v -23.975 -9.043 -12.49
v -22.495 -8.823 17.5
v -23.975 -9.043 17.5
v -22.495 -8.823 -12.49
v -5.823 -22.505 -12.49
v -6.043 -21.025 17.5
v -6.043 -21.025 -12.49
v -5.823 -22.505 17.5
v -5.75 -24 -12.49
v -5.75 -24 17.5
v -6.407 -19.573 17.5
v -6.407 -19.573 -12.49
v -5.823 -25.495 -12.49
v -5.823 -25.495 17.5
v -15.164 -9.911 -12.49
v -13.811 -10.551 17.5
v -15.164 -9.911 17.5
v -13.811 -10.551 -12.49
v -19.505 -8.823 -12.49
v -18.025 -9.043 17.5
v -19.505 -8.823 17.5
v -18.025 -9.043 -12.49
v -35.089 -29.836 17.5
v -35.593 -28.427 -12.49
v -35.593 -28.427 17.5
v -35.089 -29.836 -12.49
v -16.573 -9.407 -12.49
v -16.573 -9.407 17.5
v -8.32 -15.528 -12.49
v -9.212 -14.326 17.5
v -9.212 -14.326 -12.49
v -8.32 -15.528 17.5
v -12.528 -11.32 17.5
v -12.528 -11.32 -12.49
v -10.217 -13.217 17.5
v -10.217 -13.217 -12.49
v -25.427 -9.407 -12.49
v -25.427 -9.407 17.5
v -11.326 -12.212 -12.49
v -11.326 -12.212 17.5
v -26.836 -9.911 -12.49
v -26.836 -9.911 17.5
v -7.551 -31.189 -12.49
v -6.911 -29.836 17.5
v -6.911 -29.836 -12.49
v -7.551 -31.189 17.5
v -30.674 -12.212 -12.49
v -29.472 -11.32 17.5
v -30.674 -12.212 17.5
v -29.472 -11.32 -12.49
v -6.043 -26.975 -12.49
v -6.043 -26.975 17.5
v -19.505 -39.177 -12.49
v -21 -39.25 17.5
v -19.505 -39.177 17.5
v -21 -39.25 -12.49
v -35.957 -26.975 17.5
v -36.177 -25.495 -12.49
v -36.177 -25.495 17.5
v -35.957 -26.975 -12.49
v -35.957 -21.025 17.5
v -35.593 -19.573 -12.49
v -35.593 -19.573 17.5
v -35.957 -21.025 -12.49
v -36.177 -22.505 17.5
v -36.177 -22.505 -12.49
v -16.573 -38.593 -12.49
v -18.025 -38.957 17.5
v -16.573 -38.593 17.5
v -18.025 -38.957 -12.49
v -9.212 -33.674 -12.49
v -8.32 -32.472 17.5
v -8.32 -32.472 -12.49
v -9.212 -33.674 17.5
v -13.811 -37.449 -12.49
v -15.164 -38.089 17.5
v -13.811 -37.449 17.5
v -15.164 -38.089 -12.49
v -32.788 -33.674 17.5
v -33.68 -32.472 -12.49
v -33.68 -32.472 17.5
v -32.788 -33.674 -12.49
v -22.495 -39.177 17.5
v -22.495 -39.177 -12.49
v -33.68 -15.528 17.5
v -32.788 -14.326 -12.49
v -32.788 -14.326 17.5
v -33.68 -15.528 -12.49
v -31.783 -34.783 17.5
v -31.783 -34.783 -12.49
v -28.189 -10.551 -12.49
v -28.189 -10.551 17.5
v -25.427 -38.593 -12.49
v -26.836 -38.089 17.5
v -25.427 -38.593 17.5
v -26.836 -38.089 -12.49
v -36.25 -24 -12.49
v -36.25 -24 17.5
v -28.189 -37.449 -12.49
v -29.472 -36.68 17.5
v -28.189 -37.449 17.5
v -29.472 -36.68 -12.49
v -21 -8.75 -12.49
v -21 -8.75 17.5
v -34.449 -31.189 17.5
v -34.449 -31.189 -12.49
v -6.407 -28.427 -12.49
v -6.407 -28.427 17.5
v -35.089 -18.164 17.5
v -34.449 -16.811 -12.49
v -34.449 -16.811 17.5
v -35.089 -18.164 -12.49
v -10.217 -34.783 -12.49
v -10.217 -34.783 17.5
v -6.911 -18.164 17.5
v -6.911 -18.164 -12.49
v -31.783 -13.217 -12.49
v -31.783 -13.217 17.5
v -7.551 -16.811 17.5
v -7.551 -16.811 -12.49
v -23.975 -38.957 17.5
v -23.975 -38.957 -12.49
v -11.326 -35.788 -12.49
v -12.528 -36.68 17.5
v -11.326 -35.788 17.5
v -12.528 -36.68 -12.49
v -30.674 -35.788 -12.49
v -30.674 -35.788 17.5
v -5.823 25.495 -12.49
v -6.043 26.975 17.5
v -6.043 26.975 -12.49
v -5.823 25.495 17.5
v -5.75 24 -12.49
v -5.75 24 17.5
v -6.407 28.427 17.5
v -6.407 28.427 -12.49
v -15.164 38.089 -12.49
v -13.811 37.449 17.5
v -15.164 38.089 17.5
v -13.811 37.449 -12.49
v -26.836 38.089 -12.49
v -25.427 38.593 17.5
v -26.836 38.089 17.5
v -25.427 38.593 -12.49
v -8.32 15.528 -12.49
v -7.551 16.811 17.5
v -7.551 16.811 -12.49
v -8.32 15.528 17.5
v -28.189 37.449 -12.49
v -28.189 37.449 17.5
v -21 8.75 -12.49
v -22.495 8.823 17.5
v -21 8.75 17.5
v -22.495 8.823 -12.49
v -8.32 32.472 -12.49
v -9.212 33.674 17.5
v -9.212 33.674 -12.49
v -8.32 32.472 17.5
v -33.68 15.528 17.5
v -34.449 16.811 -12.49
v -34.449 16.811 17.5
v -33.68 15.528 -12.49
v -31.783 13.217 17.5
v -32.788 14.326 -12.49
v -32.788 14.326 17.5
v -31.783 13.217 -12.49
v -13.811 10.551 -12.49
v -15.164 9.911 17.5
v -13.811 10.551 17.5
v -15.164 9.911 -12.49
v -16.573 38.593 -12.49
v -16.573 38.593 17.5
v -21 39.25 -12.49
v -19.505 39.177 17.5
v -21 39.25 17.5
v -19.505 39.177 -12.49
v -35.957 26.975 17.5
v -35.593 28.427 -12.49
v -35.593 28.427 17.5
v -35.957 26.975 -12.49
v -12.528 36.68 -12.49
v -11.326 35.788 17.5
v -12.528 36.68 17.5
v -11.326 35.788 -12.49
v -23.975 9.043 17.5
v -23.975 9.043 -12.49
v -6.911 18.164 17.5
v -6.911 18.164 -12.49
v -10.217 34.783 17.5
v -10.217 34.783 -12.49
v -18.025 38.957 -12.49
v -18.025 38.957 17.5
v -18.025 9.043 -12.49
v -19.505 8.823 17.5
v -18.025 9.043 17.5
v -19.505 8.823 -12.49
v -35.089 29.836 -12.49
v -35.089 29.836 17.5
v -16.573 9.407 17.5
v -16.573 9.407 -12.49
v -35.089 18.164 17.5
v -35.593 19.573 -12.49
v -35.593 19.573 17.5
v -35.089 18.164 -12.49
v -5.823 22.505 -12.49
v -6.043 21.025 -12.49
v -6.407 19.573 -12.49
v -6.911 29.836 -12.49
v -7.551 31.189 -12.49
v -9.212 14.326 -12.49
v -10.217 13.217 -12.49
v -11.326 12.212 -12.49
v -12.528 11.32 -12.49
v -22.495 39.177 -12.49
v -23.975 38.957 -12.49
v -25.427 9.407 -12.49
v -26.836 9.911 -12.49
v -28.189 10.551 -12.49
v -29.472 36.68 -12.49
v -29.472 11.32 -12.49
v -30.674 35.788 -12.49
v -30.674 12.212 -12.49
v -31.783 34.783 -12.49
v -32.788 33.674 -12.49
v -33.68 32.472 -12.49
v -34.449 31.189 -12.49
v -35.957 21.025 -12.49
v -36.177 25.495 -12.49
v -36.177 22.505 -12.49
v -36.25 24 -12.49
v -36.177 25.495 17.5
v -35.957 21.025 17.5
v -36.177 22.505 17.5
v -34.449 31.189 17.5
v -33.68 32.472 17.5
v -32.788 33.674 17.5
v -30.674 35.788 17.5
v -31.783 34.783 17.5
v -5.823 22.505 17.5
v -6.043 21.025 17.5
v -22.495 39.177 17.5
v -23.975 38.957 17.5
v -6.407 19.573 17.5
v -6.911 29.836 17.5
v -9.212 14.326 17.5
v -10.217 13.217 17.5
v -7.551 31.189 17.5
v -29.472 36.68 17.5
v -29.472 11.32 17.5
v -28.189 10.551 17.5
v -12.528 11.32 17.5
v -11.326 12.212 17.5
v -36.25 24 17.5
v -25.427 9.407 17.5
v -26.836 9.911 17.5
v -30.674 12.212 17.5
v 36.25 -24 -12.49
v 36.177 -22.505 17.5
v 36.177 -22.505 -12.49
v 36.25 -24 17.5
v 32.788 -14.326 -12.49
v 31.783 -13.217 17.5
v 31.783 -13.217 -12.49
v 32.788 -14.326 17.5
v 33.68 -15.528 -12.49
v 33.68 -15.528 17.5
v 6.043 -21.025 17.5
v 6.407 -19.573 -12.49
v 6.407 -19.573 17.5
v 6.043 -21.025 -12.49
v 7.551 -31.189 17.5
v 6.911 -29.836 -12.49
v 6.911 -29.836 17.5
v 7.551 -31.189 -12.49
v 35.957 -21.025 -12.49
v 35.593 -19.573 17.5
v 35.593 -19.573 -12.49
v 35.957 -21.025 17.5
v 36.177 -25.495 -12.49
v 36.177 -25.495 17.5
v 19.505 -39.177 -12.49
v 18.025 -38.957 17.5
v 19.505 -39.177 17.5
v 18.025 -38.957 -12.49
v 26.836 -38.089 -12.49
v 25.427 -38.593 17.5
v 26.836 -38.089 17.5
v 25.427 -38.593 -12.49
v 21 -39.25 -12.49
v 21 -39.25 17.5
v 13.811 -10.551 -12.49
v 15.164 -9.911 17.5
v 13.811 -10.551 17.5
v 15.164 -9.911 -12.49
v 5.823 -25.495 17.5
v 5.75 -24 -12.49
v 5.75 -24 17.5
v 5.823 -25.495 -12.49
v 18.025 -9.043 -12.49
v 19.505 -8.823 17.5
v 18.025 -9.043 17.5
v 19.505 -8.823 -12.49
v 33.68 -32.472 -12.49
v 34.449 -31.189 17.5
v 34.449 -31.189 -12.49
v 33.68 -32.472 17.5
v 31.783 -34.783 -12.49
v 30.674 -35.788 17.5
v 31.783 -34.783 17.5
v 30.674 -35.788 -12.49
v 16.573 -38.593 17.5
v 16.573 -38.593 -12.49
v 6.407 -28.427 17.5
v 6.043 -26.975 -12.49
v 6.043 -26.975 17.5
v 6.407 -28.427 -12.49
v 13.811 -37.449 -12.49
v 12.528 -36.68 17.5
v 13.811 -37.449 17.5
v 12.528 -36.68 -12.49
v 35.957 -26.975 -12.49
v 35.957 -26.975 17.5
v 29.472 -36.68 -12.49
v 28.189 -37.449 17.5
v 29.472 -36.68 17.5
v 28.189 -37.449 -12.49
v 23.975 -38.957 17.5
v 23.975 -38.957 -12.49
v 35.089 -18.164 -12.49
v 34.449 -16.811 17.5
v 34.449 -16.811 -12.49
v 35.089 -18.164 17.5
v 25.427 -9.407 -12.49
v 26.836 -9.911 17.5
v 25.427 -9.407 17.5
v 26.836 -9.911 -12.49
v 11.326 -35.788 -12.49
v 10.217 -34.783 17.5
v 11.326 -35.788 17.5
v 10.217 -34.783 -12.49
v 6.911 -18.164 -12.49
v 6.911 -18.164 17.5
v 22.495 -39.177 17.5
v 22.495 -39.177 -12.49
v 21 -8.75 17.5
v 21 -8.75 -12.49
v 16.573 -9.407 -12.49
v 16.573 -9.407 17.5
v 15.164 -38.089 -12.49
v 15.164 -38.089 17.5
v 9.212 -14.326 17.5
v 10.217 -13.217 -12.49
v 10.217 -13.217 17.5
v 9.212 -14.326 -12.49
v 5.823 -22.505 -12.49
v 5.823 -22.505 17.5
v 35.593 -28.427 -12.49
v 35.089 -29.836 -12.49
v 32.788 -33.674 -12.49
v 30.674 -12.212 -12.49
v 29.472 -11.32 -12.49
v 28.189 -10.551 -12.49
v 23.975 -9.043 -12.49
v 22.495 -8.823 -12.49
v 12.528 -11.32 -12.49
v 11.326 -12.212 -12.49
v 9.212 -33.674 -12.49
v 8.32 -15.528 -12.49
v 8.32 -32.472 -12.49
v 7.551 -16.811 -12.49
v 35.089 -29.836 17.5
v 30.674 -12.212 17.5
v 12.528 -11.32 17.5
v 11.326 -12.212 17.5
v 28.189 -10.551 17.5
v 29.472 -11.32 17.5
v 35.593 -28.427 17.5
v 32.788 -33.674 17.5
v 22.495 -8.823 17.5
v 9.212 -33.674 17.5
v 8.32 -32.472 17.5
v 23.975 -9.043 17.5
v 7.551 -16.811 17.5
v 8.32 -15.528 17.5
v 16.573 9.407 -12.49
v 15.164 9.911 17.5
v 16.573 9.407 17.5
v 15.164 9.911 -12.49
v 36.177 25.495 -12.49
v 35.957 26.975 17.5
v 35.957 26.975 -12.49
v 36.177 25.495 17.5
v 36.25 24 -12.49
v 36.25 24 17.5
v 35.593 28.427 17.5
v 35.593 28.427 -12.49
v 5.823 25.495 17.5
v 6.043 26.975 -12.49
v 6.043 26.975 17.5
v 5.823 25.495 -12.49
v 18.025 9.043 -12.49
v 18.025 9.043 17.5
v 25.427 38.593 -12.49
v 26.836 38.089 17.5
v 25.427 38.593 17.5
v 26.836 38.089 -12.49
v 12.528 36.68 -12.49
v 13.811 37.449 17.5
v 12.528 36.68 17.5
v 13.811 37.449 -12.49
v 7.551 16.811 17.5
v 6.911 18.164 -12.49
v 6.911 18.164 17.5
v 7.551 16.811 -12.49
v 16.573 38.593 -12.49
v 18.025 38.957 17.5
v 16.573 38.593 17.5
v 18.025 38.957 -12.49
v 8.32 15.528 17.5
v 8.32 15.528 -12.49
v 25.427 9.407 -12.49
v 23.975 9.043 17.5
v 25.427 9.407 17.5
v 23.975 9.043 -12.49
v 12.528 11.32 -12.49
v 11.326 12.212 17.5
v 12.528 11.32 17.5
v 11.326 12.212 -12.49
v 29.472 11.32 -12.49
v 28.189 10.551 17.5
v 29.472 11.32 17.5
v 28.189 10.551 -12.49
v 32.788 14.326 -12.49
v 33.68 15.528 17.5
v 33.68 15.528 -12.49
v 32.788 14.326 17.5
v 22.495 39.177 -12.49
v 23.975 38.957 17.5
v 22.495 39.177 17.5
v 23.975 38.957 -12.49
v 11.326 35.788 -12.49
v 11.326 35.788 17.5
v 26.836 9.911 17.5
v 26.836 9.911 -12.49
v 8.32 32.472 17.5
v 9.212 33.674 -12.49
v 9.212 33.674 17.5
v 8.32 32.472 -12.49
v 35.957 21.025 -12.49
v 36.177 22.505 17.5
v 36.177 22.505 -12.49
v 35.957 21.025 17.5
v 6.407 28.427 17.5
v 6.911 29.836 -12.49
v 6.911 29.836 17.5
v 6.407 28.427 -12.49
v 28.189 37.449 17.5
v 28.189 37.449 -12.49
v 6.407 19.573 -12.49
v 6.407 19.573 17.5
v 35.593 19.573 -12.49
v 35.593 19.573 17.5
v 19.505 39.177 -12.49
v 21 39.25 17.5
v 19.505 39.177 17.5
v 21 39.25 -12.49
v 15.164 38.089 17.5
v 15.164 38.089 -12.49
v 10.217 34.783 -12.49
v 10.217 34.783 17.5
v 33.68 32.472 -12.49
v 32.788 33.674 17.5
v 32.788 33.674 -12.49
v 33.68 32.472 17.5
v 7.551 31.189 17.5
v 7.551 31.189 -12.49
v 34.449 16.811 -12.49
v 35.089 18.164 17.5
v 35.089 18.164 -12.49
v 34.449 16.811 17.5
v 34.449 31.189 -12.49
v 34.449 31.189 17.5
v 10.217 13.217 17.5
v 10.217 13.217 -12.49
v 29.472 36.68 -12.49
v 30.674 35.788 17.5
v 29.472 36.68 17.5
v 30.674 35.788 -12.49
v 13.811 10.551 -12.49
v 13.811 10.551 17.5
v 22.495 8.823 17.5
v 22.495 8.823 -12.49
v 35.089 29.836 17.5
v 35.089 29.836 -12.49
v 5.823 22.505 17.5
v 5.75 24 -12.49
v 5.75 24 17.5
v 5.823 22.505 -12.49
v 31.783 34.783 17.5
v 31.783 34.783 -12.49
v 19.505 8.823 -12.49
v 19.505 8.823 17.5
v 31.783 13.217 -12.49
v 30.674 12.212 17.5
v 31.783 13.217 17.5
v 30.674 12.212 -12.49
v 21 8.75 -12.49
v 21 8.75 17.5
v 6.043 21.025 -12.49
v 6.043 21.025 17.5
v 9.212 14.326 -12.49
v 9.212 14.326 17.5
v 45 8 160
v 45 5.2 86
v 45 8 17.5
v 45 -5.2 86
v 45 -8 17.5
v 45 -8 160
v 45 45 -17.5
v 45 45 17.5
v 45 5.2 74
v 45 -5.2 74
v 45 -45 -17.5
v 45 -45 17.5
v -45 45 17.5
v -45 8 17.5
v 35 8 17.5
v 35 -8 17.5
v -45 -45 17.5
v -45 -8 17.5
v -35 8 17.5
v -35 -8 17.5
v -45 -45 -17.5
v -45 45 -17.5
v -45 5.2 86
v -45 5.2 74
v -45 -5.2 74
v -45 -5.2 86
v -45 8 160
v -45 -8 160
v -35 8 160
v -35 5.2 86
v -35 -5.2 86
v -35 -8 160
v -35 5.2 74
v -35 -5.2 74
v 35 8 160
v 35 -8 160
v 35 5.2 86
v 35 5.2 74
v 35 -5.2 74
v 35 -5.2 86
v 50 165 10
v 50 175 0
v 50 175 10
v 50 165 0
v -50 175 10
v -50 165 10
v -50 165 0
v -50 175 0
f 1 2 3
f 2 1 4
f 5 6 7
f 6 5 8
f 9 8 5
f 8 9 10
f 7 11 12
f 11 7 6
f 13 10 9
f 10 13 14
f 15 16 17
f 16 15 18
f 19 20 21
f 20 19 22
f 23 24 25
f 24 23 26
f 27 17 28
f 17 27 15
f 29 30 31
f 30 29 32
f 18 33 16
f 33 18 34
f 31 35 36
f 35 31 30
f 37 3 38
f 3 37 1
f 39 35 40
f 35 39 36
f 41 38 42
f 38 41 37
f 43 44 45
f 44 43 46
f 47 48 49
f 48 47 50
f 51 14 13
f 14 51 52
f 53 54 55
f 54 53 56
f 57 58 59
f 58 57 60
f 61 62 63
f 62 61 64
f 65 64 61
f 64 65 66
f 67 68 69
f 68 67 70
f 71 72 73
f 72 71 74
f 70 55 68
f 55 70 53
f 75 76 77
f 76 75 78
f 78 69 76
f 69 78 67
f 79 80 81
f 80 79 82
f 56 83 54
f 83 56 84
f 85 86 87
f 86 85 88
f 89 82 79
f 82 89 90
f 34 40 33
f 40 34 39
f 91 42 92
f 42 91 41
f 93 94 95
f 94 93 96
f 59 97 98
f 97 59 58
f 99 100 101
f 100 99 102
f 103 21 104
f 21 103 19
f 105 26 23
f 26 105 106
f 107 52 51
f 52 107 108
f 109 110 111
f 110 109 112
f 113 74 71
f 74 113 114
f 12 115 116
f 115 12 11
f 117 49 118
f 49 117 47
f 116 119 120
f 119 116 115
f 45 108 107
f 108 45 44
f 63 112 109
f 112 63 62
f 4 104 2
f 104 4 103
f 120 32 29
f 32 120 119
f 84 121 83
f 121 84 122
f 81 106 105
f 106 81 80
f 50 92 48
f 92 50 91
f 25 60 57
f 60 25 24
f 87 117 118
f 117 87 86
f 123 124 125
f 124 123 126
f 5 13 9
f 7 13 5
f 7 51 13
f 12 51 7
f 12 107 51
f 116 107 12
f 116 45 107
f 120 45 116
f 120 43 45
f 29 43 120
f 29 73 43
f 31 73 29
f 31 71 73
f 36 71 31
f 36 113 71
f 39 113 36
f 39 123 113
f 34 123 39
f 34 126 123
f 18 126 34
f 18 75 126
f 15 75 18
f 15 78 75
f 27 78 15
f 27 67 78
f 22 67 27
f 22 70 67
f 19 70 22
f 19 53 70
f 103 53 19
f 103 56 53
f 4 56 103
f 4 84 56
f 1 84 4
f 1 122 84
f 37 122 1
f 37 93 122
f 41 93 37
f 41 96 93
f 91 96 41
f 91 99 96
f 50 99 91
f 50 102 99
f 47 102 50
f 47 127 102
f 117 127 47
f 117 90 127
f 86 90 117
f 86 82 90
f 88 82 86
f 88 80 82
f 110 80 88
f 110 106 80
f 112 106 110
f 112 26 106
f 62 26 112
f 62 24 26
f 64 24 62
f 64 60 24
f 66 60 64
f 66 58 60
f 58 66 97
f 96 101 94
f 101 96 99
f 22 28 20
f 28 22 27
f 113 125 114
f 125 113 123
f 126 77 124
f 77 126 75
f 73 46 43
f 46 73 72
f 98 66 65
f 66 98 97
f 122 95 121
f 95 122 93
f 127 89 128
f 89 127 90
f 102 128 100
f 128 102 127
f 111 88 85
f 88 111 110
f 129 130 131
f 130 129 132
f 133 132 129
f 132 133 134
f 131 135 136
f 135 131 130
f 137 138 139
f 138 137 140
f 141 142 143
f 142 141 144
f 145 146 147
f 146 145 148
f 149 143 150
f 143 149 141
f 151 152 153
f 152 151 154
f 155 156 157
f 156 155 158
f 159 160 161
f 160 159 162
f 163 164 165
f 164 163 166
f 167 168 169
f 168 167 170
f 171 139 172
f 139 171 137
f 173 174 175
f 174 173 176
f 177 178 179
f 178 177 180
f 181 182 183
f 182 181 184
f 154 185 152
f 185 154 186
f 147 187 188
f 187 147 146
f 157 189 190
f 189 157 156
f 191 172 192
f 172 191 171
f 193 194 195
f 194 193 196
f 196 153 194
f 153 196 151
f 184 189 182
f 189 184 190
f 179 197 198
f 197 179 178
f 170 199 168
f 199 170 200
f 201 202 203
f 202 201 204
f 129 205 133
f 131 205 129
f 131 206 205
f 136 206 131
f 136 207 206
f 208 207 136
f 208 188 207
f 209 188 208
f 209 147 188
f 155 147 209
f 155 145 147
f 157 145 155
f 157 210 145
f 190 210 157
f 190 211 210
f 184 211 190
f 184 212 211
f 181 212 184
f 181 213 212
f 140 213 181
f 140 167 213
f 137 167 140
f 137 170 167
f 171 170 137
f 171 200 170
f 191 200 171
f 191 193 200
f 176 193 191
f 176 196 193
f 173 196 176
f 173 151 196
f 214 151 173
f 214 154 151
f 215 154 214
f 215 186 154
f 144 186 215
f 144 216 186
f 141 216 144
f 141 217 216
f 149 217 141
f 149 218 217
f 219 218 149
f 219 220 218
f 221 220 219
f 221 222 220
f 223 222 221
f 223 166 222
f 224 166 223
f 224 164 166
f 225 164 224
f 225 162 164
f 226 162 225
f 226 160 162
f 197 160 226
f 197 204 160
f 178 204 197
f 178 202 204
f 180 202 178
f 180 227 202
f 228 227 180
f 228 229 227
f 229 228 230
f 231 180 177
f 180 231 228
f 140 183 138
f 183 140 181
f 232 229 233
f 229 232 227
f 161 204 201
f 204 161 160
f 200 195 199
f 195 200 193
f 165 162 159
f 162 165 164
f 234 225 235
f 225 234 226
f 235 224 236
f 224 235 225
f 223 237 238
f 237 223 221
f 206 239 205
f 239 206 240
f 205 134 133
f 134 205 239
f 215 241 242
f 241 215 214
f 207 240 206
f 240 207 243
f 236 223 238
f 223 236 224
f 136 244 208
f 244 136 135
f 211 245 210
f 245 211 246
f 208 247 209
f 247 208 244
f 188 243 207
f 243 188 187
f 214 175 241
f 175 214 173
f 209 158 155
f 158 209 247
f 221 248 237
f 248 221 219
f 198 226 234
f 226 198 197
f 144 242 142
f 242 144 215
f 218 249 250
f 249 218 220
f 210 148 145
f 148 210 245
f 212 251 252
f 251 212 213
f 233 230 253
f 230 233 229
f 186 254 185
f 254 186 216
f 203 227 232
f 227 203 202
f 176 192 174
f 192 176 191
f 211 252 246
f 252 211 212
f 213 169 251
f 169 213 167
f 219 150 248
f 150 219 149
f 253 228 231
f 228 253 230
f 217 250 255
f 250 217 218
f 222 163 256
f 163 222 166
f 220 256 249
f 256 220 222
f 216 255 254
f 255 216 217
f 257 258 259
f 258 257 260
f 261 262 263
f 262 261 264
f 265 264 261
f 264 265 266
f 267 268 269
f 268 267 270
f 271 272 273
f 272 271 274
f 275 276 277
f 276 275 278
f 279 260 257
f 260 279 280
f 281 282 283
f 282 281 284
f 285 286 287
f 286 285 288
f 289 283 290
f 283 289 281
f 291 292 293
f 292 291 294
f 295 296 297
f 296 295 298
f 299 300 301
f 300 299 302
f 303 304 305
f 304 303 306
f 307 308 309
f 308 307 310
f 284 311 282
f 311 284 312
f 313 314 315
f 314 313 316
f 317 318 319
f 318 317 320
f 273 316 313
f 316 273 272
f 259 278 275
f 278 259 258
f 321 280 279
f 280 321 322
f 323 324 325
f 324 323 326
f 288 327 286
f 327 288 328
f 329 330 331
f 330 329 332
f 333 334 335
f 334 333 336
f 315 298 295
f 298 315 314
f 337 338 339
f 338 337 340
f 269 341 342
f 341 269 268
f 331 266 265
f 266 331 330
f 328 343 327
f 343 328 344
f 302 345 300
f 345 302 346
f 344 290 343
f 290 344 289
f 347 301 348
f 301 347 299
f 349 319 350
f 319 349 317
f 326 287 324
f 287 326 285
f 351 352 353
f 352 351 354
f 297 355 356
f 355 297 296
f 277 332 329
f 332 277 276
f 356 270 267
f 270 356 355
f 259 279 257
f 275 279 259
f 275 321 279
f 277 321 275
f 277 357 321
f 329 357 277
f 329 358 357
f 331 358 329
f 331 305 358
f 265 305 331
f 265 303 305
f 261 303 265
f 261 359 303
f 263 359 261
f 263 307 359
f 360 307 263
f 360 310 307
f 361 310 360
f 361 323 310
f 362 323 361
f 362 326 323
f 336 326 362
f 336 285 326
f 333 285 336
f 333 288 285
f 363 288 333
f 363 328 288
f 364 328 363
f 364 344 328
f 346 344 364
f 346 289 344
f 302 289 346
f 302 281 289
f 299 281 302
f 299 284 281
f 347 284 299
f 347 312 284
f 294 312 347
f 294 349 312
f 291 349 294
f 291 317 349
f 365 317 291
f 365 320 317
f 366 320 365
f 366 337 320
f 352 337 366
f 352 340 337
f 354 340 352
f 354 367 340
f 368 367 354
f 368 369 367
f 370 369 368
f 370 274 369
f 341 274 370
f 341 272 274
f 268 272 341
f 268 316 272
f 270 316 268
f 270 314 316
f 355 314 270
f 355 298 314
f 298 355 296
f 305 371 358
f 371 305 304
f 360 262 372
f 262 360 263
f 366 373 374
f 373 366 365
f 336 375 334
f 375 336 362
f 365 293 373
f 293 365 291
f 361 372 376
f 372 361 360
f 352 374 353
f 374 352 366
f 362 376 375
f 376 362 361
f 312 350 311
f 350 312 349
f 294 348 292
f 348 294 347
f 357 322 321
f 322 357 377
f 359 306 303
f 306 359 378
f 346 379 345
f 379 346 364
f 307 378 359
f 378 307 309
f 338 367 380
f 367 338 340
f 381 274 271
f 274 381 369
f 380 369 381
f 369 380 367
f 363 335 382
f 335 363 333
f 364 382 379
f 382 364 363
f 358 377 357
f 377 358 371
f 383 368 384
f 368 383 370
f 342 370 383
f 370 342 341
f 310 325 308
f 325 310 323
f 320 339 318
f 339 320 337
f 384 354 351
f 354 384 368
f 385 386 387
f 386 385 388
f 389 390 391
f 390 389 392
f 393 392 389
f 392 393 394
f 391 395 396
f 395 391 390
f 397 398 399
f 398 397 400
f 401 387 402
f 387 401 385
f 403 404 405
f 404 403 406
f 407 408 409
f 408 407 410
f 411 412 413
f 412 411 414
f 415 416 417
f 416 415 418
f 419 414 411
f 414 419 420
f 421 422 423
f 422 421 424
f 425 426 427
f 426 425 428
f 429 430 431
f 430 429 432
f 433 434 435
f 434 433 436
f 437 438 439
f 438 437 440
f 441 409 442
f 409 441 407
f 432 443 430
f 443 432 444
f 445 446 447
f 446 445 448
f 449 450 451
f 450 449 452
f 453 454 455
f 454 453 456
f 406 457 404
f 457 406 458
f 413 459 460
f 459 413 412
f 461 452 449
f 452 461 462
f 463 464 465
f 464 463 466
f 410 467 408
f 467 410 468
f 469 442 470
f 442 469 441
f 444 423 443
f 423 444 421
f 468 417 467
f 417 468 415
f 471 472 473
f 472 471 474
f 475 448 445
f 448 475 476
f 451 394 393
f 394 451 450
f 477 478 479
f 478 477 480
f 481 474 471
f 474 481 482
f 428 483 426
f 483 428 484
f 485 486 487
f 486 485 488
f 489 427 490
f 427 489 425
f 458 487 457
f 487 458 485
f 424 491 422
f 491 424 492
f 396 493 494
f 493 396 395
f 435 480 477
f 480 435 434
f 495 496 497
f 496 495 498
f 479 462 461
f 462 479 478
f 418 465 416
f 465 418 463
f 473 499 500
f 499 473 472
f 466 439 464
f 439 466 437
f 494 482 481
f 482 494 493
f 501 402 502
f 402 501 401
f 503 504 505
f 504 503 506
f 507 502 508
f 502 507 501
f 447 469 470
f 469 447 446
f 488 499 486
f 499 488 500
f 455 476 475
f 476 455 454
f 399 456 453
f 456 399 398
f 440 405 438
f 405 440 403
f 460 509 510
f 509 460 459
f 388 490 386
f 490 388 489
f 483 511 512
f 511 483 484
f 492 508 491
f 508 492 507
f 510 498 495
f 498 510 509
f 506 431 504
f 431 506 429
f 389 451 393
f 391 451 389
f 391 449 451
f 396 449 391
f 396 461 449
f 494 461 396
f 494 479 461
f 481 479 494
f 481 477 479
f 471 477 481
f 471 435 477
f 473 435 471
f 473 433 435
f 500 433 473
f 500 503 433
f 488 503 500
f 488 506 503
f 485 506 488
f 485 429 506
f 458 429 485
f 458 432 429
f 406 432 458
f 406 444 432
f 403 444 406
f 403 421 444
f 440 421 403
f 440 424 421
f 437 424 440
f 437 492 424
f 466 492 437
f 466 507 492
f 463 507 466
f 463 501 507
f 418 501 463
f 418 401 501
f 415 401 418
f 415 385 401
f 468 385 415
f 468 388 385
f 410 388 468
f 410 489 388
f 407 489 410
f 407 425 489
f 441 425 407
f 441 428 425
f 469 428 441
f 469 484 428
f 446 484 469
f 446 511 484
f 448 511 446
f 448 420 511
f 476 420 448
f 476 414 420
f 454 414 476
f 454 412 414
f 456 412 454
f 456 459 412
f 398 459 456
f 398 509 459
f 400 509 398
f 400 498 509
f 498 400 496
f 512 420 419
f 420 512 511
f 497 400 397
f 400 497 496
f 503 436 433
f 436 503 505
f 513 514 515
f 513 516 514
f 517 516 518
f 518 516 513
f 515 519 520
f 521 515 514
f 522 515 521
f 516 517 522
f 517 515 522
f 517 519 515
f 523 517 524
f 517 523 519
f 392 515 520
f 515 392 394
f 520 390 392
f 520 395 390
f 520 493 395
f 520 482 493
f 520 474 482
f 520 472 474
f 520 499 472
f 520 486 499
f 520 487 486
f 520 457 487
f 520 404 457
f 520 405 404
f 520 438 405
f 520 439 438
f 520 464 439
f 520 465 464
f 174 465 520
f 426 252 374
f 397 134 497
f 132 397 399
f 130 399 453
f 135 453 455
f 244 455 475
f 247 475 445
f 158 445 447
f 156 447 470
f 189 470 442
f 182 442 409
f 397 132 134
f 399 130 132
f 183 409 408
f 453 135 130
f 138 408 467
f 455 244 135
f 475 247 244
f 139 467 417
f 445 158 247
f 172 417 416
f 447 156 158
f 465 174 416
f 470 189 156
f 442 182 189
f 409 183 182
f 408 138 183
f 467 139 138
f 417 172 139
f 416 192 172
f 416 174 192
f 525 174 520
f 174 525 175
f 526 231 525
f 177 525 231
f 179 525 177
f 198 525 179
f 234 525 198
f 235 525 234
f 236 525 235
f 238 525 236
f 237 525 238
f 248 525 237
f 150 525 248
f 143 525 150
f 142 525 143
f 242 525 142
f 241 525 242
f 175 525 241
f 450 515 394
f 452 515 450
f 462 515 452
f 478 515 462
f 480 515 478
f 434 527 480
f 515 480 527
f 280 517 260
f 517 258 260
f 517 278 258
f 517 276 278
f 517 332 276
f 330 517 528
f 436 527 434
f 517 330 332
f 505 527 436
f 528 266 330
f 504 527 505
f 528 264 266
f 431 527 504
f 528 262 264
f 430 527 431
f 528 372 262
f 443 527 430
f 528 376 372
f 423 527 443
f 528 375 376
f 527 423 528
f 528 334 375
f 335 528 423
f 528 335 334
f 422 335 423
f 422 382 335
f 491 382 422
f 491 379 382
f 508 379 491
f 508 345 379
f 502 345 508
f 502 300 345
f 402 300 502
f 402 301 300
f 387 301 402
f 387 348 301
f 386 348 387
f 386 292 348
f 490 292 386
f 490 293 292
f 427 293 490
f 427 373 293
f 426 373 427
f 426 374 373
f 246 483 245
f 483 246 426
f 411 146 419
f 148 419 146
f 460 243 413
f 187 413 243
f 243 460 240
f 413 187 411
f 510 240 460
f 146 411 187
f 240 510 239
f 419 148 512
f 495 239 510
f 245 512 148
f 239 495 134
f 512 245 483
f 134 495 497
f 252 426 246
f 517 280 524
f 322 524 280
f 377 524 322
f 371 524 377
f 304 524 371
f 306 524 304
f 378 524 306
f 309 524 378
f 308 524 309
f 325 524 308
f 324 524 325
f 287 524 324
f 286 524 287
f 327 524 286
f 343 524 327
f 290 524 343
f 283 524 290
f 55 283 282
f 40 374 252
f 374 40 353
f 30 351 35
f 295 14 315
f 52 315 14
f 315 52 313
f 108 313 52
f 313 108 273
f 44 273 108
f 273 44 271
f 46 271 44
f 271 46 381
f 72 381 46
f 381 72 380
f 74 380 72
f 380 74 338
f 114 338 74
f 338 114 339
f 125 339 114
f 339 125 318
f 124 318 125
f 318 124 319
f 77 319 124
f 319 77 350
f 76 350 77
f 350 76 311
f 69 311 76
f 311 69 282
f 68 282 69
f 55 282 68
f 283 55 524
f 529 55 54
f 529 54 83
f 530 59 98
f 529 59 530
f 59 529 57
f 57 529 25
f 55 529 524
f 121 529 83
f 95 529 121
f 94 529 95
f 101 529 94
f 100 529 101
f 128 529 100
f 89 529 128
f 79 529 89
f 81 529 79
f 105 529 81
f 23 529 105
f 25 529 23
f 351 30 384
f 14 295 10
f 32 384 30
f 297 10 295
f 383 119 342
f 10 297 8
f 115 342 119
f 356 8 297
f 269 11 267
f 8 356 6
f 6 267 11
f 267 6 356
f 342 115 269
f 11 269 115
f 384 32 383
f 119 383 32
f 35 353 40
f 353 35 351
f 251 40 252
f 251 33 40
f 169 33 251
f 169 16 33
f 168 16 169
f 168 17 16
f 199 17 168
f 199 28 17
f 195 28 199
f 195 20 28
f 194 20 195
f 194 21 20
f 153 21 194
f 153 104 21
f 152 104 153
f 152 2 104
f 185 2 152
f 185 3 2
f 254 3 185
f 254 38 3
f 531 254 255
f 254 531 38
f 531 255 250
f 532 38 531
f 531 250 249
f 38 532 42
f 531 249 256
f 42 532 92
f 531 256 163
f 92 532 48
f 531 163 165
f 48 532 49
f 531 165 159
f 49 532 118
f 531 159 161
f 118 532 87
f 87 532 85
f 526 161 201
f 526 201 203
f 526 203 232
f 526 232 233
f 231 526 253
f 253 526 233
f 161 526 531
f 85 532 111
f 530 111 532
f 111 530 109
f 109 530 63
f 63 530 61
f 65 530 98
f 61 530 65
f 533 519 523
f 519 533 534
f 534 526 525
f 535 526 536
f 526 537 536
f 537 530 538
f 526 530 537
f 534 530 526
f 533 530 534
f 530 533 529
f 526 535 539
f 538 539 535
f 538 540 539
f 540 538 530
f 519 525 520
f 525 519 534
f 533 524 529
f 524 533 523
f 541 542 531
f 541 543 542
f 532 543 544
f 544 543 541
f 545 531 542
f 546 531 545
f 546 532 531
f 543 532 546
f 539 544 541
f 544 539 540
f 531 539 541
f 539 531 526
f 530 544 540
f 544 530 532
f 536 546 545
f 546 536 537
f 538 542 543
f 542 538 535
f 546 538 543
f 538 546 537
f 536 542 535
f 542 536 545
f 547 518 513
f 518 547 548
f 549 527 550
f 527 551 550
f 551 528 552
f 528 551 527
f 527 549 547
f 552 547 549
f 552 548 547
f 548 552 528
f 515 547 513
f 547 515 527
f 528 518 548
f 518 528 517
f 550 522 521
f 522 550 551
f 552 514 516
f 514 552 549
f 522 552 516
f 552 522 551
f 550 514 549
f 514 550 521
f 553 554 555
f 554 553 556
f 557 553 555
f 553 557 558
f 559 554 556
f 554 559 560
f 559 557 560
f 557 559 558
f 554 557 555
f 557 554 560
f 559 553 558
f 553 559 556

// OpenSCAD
// --- Dimensions ---
// Part 1: Base Block
base_width = 90;          // X dimension of base
base_depth = 90;          // Y dimension of base
base_height = 35;         // Z dimension of base

// Tube Seats (Blind holes)
seat_dia = 30.5;          // Diameter of tube seats
seat_depth = 30;          // Depth of the seat cut
seat_floor = 5;           // Remaining floor thickness (35 - 30)
seat_x_pos = [ -21, 21 ]; // X coordinates of seats
seat_y_pos = [ -24, 24 ]; // Y coordinates of seats

// Posts
post_thickness = 10;      // X dimension of posts
post_width = 16;          // Y dimension of posts
post_height = 160;        // Z height of posts
post_hole_size = 10.4;    // Square hole dimension (X-axis through-hole)
post_hole_z = 150;        // Z center of the hole

// Part 2: Handle
handle_width = 10;        // X dimension of handle
handle_depth = 10;        // Y dimension of handle
handle_length = 100;      // X dimension of handle
handle_y_start = 55;      // Y start position
handle_y_end = 65;        // Y end position

// General
$fn = 64;

// --- Part 1: Base and Posts ---
module part_1() {
    // Base Block
    difference() {
        // Main block
        cube([base_width, base_depth, base_height], center = true);
        
        // Tube Seats (Blind holes)
        // We translate the center to the specified coordinates. 
        // Since cube is centered, we adjust for the offset.
        for (i = [0:1]) {
            for (j = [0:1]) {
                translate([seat_x_pos[i], seat_y_pos[j], base_height/2 - seat_depth + 0.01])
                    cylinder(d = seat_dia, h = seat_depth + 0.02);
            }
        }
    }

    // Posts
    // Posts are flush with end faces (X = +/- 45). 
    // Thickness is 10, so they occupy X from 35 to 45 and -45 to -35.
    // Centered on Y=0.
    for (side = [-1, 1]) {
        translate([side * (base_width/2 - post_thickness/2), 0, post_height/2]) {
            difference() {
                // Post body
                cube([post_thickness, post_width, post_height], center = true);
                
                // Square hole through X axis
                // We rotate 90 deg around Y to align hole with X axis
                rotate([0, 90, 0])
                    cube([post_thickness + 2, post_hole_size, post_hole_size], center = true);
            }
        }
    }
}

// --- Part 2: Handle ---
module part_2() {
    // Handle is a square bar 10x10x100
    // Lying on bed along X, centered on X=0.
    // Spans Y from 55 to 65.
    // Since it's a 10x10 bar, and Y is 55 to 65, the center is Y=60.
    // The Z height is 10, so it sits on the bed (Z=0 to 10).
    
    translate([0, 60, 5]) // Center Y at 60, Z center at 5
        cube([handle_length, handle_depth, handle_width], center = true);
}

// --- Rendering ---
// To print these side-by-side, we place them on the XY plane.
// Part 1 is already centered at origin.
// Part 2 is moved to sit next to Part 1.

// Part 1
translate([0, 0, 0]) 
    part_1();

// Part 2 (Moved to avoid collision, placed at Y = 110)
translate([0, 110, 0]) 
    part_2();
